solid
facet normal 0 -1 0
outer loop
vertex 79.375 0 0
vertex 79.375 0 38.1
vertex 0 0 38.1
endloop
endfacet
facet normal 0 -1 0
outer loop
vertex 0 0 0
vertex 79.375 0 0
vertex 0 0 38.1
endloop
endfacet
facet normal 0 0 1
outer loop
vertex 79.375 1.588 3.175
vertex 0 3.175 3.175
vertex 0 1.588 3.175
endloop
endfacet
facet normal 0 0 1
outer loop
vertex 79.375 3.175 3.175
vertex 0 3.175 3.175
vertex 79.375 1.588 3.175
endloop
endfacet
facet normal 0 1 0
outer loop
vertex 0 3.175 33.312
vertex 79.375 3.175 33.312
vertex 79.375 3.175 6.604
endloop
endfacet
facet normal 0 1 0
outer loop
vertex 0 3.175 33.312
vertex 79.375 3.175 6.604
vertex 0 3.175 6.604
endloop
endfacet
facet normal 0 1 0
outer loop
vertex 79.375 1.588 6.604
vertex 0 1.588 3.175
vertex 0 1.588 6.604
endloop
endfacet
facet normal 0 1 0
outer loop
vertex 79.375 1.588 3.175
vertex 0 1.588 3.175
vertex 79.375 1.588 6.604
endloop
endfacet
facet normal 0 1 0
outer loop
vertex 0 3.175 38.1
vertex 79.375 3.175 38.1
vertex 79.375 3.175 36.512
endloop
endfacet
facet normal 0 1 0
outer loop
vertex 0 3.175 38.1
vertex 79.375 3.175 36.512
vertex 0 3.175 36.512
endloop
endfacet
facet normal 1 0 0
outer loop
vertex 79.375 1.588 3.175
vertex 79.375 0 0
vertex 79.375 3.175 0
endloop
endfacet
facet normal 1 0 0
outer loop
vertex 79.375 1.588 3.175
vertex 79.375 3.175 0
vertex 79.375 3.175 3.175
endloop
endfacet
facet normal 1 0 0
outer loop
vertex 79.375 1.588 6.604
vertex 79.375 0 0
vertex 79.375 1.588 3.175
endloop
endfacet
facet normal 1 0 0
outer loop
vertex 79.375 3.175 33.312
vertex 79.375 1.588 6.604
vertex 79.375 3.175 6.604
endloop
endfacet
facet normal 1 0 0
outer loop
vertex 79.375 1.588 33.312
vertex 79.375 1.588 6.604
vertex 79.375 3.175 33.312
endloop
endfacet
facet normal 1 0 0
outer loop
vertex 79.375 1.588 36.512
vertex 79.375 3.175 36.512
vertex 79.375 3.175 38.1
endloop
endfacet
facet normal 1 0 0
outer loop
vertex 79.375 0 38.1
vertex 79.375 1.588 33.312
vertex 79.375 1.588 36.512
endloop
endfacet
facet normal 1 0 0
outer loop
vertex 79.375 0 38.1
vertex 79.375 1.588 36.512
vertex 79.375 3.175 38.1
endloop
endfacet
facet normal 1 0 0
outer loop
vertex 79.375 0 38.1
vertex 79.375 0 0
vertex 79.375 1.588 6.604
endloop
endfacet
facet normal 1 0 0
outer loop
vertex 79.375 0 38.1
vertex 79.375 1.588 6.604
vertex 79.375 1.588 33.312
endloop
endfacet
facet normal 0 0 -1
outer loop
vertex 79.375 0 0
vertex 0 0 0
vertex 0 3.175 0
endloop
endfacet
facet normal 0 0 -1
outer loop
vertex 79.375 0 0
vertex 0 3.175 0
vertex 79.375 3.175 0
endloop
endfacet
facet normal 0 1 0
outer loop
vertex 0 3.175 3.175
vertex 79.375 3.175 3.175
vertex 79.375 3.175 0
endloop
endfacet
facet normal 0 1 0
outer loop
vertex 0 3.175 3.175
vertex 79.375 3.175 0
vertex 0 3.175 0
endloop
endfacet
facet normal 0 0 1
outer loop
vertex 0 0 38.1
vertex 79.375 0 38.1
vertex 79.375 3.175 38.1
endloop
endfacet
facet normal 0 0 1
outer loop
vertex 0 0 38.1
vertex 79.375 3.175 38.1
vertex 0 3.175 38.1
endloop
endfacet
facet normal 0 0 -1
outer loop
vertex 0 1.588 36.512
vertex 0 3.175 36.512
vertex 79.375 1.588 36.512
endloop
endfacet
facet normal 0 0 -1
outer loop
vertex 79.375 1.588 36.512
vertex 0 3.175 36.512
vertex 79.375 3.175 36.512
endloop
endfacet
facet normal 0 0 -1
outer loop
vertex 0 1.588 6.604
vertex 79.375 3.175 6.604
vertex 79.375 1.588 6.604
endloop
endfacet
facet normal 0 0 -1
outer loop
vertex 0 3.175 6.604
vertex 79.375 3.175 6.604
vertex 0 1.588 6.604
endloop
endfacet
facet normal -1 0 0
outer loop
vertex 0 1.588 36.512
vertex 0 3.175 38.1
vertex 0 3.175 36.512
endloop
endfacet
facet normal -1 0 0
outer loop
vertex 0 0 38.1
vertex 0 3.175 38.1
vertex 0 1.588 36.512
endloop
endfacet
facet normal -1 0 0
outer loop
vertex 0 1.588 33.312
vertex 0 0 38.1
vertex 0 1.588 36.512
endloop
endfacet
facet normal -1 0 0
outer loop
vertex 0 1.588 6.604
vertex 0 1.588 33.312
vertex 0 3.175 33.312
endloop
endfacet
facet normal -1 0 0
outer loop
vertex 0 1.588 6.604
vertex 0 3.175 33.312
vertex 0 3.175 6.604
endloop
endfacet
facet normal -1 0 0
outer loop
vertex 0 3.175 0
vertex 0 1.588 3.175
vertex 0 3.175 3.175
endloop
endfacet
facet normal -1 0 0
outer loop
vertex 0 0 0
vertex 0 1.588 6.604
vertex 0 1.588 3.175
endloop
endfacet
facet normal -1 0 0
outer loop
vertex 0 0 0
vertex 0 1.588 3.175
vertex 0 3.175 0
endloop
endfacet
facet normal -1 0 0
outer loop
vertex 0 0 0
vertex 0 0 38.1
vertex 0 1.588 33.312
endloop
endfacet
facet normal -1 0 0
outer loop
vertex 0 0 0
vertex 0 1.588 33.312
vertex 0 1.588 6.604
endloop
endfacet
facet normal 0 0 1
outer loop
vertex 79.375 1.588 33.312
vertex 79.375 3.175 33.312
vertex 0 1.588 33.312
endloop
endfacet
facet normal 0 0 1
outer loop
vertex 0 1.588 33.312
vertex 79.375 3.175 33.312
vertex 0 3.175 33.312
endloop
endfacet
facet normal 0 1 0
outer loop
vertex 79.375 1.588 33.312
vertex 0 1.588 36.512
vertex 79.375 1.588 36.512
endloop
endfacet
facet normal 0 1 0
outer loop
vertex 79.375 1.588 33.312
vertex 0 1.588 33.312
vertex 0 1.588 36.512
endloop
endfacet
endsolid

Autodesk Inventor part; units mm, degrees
ref_plane "YZ Plane" through (0, 0, 0) normal (1, 0, 0) x (0, 1, 0)
ref_plane "XZ Plane" through (0, 0, 0) normal (0, 1, 0) x (-1, 0, 0)
ref_plane "XY Plane" through (0, 0, 0) normal (0, 0, 1) x (1, 0, 0)
sketch "Sketch1" plane through (0, 0, 0) normal (0, 1, 0) x (-1, 0, 0)
  line L0 (0, 0) -> (-79.375, 0)
  line L1 (-79.375, 0) -> (-79.375, 38.1)
  line L2 (-79.375, 38.1) -> (0, 38.1)
  line L3 (0, 38.1) -> (0, 0)
  dimension "d0" = 79.375
  dimension "d1" = 38.1
extrude "Extrusion1" add sketch "Sketch1" along normal blind 3.175
sketch "Sketch2" plane through (0, 3.175, 0) normal (0, 1, 0) x (1, 0, 0)
  line L0 (79.375, 0) -> (0, 0) projected
  line L1 (0, 0) -> (0, -38.1) projected
  line L2 (0, -38.1) -> (79.375, -38.1) projected
  line L3 (79.375, -38.1) -> (79.375, 0) projected
  line L4 (0, -3.175) -> (79.375, -3.175)
  line L5 (79.375, -3.175) -> (79.375, -6.604)
  line L6 (79.375, -6.604) -> (0, -6.604)
  line L7 (0, -6.604) -> (0, -3.175)
  line L8 (79.375, -33.3121) -> (0, -33.3121)
  line L9 (0, -33.3121) -> (0, -36.5125)
  line L10 (0, -36.5125) -> (79.375, -36.5125)
  line L11 (79.375, -36.5125) -> (79.375, -33.3121)
  dimension "d4" = 3.429
  dimension "d5" = 3.175
  dimension "d6" = 3.2004
  dimension "d7" = 1.5875
extrude "Extrusion2" cut sketch "Sketch2" against normal blind 1.5875 contours L3 L6 L1 L4 | L3 L10 L1 L8
properties part number "Electronics Container Part 3"
